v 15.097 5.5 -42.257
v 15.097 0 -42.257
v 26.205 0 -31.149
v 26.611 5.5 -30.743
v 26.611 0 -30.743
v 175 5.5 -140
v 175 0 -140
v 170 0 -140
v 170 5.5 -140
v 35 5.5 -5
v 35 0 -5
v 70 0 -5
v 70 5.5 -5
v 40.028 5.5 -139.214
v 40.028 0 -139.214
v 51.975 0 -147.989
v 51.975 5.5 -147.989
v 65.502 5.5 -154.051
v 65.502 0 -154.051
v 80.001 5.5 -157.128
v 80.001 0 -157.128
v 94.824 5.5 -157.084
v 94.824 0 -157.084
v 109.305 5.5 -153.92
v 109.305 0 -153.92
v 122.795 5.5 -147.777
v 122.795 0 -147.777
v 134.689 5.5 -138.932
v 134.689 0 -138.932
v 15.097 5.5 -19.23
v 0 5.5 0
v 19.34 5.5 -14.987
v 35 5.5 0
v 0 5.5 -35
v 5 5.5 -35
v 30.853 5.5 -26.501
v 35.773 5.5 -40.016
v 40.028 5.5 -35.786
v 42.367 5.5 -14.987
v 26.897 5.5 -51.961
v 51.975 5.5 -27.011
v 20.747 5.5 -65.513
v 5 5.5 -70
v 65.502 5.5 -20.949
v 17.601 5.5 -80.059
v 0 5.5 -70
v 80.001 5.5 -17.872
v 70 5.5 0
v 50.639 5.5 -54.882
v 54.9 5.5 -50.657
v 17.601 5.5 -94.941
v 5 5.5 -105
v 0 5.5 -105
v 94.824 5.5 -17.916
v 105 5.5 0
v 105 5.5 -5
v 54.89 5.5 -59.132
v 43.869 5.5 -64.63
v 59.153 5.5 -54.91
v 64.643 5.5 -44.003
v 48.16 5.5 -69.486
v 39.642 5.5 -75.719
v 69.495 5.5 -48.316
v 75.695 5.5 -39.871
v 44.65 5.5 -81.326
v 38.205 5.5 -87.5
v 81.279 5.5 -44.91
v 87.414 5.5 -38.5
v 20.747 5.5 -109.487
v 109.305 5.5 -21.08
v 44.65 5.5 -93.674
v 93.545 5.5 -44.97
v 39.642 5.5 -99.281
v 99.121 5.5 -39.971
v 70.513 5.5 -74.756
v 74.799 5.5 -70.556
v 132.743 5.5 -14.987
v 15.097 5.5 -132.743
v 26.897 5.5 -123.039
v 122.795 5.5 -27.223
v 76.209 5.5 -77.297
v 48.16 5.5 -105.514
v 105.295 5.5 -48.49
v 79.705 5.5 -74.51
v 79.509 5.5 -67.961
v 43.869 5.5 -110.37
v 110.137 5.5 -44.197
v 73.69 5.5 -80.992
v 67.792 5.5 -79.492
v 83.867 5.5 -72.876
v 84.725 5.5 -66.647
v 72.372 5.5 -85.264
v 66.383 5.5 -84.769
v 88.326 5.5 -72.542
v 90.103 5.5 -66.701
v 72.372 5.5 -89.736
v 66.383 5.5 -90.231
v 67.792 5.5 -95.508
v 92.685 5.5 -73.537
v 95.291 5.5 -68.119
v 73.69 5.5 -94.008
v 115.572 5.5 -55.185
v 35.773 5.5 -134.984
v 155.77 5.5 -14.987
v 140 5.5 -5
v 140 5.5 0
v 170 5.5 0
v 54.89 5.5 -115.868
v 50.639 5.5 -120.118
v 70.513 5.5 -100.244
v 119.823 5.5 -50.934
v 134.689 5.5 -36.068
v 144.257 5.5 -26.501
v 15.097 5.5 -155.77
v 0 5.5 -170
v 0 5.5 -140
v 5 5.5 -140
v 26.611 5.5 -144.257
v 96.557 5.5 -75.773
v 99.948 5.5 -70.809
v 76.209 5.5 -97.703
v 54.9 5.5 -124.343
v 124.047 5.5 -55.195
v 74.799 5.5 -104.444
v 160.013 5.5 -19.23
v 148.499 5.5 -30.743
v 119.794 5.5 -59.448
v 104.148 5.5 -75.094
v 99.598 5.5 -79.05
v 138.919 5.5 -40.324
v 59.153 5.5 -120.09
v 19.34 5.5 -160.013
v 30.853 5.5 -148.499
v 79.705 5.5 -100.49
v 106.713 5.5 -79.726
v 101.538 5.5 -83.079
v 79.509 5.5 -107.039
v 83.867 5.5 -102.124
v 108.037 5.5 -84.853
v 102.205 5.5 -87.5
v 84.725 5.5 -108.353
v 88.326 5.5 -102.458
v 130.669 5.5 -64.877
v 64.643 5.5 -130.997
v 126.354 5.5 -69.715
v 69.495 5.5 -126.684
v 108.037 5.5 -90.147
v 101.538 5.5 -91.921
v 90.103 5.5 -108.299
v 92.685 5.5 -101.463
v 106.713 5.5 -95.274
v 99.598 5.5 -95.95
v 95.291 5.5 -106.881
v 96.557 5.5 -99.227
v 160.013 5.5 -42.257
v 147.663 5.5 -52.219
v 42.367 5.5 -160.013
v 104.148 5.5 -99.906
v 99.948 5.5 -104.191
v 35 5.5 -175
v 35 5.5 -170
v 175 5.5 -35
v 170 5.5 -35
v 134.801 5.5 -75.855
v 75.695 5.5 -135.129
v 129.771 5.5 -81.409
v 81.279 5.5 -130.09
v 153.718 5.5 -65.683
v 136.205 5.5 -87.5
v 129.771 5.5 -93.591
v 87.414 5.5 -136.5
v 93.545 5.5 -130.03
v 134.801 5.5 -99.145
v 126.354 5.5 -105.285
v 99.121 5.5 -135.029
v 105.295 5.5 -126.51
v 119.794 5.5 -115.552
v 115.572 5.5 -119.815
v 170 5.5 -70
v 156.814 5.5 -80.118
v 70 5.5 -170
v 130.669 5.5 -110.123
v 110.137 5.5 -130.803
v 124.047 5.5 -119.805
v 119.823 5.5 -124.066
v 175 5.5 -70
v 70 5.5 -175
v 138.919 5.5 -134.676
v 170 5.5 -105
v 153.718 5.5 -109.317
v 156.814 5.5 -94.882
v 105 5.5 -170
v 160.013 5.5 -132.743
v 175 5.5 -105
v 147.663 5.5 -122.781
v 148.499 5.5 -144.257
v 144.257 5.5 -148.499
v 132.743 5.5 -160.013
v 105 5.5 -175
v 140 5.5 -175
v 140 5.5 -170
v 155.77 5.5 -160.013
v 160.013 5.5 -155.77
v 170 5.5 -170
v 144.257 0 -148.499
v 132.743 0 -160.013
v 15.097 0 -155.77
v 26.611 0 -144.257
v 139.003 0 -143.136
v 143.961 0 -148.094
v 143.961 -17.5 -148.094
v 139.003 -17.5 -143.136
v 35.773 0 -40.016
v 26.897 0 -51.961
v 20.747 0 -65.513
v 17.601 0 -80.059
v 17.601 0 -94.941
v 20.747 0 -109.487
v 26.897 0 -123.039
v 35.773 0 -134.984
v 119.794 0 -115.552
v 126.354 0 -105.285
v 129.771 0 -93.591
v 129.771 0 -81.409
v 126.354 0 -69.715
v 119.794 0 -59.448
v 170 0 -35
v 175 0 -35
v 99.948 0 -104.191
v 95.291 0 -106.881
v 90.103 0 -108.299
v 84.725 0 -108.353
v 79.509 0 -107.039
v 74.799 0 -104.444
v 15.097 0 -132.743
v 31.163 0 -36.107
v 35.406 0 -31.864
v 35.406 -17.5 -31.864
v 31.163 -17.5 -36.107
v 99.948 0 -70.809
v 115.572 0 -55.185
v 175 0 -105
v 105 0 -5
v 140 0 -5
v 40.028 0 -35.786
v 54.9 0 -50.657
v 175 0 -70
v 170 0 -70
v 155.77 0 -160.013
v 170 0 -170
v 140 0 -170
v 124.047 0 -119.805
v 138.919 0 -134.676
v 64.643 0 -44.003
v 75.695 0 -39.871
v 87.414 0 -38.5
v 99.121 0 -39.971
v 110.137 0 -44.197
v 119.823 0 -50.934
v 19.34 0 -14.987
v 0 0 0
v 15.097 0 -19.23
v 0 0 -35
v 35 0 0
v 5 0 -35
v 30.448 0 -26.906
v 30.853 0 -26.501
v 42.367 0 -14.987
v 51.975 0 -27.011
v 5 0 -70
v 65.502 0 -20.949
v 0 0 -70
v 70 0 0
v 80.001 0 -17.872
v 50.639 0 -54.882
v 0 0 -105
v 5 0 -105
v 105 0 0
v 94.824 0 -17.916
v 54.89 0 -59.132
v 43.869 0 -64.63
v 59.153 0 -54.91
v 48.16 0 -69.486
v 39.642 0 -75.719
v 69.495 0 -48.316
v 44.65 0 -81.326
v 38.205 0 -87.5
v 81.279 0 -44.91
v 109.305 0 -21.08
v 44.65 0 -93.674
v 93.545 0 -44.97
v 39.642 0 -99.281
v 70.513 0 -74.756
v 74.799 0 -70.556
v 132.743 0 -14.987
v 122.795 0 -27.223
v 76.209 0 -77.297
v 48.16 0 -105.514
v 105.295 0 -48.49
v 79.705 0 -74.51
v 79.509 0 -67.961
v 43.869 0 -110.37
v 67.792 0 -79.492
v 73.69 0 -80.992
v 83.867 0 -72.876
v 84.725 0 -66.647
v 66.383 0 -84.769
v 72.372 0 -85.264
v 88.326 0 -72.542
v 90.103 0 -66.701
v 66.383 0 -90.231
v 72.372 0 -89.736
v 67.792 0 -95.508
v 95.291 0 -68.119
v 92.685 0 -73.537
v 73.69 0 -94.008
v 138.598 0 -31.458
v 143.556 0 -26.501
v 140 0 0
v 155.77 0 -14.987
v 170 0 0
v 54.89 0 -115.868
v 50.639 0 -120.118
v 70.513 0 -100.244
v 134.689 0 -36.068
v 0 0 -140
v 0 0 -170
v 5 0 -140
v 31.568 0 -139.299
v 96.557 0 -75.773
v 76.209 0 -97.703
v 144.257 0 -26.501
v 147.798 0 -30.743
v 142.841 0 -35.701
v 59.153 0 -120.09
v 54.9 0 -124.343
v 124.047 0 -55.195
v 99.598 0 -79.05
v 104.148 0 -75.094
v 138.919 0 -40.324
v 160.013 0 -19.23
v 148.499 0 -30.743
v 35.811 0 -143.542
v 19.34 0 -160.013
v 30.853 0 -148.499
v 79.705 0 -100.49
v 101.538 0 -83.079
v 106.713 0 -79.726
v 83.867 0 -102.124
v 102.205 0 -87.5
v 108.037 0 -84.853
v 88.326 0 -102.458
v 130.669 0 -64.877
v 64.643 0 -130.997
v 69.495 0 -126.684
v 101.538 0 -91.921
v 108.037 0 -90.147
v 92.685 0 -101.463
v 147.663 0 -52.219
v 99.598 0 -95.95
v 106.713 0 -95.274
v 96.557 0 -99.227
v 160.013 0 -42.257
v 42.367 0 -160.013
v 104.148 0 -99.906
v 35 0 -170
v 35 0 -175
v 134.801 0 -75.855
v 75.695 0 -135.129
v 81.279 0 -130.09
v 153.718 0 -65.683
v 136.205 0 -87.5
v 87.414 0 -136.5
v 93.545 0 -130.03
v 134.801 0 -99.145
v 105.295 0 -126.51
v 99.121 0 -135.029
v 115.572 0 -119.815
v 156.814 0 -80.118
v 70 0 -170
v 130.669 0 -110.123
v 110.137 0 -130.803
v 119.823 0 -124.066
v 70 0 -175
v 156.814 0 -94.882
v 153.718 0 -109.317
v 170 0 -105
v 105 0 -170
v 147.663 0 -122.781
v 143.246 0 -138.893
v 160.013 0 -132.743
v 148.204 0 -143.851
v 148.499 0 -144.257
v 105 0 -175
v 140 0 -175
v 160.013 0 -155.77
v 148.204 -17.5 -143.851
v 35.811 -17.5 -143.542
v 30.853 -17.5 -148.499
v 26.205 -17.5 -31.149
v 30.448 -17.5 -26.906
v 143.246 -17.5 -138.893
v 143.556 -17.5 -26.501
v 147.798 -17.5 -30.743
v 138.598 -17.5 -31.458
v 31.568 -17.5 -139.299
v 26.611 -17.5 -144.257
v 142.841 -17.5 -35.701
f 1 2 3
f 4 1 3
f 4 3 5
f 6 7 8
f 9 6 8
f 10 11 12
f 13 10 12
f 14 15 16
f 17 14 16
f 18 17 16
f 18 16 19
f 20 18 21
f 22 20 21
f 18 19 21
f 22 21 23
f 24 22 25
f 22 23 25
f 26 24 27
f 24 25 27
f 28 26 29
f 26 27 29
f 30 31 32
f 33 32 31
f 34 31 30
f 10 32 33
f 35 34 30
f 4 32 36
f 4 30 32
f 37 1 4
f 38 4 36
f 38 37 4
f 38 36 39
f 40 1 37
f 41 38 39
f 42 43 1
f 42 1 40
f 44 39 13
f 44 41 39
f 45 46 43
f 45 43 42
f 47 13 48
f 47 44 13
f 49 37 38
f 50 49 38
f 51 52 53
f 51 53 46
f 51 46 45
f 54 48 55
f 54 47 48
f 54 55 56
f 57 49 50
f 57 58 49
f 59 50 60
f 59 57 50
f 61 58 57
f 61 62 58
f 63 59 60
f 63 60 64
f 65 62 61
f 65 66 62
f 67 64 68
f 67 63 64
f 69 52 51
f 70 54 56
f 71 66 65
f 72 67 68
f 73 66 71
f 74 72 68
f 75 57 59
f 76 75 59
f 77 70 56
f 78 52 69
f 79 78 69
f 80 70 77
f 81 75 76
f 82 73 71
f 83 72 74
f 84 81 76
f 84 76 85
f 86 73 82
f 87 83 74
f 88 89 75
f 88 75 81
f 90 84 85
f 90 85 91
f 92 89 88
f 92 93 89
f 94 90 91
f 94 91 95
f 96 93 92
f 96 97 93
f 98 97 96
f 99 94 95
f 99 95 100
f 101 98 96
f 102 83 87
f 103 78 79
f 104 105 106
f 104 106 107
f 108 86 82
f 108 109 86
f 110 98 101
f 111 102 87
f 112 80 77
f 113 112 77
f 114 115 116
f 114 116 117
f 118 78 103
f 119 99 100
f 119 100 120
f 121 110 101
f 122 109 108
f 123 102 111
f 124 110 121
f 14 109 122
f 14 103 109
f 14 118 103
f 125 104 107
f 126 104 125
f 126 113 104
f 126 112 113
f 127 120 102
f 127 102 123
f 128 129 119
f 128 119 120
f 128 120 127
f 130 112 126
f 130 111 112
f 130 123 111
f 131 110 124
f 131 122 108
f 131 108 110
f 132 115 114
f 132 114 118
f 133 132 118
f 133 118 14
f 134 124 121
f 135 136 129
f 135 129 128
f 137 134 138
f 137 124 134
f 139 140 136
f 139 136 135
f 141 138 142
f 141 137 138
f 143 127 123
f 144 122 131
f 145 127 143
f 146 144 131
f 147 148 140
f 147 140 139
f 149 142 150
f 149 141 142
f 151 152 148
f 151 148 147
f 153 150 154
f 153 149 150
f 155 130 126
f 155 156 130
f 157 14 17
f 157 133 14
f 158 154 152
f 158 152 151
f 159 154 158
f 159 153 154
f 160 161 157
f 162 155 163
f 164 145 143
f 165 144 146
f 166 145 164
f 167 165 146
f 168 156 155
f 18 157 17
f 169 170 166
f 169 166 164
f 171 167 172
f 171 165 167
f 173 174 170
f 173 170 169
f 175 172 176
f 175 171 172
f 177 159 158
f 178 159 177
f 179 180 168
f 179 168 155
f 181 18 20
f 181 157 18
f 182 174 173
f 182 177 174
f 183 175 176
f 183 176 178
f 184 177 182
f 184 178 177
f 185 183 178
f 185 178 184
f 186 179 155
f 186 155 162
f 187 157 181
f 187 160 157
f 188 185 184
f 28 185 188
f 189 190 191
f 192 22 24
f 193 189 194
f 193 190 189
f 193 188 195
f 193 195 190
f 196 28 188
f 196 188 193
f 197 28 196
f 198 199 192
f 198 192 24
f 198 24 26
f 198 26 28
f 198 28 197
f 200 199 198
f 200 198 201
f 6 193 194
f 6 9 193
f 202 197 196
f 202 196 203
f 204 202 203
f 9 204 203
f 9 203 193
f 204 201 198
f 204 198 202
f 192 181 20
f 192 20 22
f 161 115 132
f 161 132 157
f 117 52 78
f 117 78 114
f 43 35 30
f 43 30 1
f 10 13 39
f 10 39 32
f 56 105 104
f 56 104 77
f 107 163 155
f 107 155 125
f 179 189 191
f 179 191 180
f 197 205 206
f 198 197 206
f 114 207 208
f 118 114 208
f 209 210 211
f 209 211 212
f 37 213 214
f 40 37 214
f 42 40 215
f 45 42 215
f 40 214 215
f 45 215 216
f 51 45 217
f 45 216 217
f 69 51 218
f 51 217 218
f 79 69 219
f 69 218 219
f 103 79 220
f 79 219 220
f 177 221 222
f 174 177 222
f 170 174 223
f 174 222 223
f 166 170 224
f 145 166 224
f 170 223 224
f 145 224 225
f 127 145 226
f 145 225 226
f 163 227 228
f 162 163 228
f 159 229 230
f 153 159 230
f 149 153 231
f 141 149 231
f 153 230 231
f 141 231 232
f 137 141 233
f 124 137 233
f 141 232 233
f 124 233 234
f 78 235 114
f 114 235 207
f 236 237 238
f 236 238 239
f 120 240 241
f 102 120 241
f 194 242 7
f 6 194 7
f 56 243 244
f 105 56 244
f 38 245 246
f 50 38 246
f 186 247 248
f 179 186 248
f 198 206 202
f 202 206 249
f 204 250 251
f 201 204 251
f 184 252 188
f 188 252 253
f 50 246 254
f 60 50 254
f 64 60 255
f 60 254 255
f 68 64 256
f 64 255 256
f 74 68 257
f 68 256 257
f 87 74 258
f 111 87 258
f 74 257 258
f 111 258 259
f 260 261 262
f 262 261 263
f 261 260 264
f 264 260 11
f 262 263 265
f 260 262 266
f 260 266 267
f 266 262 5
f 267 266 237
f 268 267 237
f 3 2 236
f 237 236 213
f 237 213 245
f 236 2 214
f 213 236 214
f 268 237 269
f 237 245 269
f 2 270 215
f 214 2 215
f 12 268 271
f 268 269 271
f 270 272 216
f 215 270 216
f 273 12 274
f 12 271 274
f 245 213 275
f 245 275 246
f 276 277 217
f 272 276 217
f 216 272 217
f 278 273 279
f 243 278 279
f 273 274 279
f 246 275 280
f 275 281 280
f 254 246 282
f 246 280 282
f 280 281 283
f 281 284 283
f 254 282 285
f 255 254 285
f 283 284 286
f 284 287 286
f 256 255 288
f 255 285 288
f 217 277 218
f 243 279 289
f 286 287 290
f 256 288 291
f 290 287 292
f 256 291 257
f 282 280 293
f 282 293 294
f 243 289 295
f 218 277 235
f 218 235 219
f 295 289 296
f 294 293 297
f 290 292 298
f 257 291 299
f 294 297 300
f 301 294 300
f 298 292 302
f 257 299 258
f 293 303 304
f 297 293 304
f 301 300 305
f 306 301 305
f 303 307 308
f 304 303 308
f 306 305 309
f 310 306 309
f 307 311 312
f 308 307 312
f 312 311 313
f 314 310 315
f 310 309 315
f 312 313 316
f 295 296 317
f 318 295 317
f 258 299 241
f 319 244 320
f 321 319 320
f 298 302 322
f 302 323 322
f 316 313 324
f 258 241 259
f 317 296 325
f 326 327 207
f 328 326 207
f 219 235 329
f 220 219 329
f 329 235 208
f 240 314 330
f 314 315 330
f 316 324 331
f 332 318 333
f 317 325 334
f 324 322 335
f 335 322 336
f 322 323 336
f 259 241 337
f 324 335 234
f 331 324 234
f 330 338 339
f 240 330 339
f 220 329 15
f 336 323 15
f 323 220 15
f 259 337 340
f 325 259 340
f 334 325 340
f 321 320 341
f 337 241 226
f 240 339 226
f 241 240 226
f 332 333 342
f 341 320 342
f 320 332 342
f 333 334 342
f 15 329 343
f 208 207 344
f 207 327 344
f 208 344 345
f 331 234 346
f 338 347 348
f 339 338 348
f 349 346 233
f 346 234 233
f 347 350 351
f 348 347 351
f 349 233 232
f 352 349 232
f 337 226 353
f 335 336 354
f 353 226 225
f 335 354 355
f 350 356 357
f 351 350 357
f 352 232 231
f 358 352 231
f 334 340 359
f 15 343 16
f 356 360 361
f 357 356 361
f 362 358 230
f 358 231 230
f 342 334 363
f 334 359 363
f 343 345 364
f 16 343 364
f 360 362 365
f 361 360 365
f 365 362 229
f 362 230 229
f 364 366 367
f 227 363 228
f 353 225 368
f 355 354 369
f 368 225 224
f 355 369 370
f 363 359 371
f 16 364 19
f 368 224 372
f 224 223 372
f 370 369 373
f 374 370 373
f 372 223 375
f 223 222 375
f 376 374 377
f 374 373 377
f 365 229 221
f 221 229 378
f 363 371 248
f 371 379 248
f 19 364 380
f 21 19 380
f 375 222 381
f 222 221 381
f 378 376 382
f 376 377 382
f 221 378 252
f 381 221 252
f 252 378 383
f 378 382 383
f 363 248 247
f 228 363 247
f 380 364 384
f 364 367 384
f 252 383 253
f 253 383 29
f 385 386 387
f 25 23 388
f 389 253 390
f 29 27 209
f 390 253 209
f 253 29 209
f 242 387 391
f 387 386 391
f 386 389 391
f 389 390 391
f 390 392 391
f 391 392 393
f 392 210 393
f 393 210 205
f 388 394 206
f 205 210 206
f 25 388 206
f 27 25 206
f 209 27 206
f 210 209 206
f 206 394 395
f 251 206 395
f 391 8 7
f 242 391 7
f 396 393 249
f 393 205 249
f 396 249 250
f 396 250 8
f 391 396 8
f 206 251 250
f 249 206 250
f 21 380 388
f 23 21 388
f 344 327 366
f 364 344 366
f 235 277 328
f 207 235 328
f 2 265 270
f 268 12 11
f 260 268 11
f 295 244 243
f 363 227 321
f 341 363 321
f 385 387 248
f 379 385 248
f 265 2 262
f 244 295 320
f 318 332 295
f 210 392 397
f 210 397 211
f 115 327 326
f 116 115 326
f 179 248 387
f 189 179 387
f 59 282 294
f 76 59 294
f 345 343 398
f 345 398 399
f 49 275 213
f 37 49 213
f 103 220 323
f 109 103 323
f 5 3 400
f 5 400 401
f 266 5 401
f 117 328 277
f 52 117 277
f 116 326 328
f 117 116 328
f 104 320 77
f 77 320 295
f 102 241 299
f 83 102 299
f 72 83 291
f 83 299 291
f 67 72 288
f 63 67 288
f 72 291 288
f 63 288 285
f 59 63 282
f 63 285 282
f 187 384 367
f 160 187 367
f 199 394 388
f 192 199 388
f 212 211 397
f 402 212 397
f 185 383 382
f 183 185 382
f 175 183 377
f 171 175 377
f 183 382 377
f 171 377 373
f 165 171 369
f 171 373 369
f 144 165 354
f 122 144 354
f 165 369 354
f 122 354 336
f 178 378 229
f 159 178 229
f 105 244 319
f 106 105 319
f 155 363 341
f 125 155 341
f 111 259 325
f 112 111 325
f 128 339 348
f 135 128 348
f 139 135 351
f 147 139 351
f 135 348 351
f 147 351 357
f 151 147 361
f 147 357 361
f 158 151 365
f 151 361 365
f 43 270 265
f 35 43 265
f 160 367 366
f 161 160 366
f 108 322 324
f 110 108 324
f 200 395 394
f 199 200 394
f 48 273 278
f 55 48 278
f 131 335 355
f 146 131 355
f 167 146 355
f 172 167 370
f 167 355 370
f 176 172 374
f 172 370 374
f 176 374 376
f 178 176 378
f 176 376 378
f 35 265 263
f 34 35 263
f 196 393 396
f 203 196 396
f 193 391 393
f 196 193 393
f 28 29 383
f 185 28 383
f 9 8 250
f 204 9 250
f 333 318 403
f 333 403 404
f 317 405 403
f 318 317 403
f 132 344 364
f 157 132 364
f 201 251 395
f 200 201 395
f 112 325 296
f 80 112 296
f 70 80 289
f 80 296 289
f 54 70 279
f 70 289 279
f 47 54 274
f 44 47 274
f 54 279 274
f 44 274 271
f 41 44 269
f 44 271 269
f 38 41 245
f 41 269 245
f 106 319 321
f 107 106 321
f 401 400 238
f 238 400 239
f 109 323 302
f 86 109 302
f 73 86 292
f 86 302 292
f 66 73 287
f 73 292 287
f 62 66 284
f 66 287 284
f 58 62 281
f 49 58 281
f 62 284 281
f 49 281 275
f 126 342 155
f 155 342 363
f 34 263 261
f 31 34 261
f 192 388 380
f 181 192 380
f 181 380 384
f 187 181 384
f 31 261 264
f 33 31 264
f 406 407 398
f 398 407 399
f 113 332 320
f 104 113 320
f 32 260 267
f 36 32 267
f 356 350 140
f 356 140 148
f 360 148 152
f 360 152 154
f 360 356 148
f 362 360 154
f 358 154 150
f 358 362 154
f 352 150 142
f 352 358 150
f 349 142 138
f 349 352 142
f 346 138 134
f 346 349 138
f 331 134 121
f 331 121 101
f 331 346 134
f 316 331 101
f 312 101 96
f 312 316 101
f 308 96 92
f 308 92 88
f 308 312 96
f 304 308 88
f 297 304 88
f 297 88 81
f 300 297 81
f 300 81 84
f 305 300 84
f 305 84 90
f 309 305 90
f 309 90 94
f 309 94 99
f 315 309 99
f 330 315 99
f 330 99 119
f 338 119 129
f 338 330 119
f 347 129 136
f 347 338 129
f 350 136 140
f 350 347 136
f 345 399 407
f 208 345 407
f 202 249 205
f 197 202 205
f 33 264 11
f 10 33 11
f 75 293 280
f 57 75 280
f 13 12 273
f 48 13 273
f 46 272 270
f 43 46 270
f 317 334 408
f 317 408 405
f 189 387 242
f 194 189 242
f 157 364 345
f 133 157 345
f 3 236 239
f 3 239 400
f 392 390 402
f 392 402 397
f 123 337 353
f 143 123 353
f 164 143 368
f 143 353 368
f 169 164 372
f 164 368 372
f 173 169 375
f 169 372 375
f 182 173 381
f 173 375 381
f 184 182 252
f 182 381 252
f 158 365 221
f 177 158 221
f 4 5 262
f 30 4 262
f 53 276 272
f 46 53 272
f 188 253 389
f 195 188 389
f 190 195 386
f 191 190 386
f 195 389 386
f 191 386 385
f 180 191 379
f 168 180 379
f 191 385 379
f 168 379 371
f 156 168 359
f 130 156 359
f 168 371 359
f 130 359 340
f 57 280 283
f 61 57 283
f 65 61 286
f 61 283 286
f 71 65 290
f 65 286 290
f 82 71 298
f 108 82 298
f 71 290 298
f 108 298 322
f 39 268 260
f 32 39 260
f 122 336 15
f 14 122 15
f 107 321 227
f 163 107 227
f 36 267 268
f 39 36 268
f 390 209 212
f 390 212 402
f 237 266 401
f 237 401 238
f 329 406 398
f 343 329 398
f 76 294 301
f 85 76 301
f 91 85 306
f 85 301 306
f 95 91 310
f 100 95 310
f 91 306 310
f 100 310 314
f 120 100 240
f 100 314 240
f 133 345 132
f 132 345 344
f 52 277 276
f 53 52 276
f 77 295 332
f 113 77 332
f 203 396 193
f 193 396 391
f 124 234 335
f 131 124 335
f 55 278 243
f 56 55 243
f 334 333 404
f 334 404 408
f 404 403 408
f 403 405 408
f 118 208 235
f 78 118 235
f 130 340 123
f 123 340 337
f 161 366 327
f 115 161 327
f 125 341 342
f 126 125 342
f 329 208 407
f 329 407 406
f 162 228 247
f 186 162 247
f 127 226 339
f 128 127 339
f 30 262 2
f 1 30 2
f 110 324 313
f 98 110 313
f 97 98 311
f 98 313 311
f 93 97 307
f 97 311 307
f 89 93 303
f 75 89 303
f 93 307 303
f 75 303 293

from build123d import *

# Parameters (mm, degrees)
SKETCH_1_R      = 15
EXTRUDE_2_DEPTH = 5.5
EXTRUDE_3_DEPTH = 23


with BuildPart() as part:
    # Эскиз1 → Бобышка-Вытянуть2 (new body)
    with BuildSketch(Plane(origin=(0, 0, 0), x_dir=(1, 0, 0), z_dir=(0, 1, 0))):
        Polygon((170, 140), (170, 170), (140, 170), (140, 175), (105, 175), (105, 170), (70, 170), (70, 175), (35, 175), (35, 170), (0, 170), (0, 140), (5, 140), (5, 105), (0, 105), (0, 70), (5, 70), (5, 35), (0, 35), (0, 0), (35, 0), (35, 5), (70, 5), (70, 0), (105, 0), (105, 5), (140, 5), (140, 0), (170, 0), (170, 35), (175, 35), (175, 70), (170, 70), (170, 105), (175, 105), (175, 140), align=None)
        Polygon((19.339817755, 14.98716546), (30.853332638, 26.500680342), (42.36684752, 14.98716546), align=None, mode=Mode.SUBTRACT)
        Polygon((26.610691951, 30.743321029), (15.097177068, 19.229806147), (15.097177068, 42.256835911), align=None, mode=Mode.SUBTRACT)
        with BuildLine():
            ThreePointArc((54.899758827, 50.65711814), (87.41386875, 38.50044692), (119.822950774, 50.934408539))
            Line((119.822950774, 50.934408539), (134.689086203, 36.06827311))
            ThreePointArc((134.689086203, 36.06827311), (87.41366824, 17.500312244), (40.028175023, 35.785534336))
            Line((40.028175023, 35.785534336), (54.899758827, 50.65711814))
        make_face(mode=Mode.SUBTRACT)
        with BuildLine():
            Line((35.772862168, 134.984497145), (50.638997596, 120.118361717))
            ThreePointArc((50.638997596, 120.118361717), (38.204589058, 87.5), (50.638997596, 54.881638283))
            Line((50.638997596, 54.881638283), (35.772862168, 40.015502855))
            ThreePointArc((35.772862168, 40.015502855), (17.204589058, 87.5), (35.772862168, 134.984497145))
        make_face(mode=Mode.SUBTRACT)
        with BuildLine():
            ThreePointArc((74.798754674, 70.556113987), (87.415641051, 66.501060573), (99.948475479, 70.808883834))
            Line((99.948475479, 70.808883834), (115.572444887, 55.184914426))
            ThreePointArc((115.572444887, 55.184914426), (87.413986392, 44.500509855), (59.152804826, 54.910164139))
            Line((59.152804826, 54.910164139), (74.798754674, 70.556113987))
        make_face(mode=Mode.SUBTRACT)
        Polygon((155.770193853, 14.98716546), (132.743164089, 14.98716546), (144.256678971, 26.500680342), align=None, mode=Mode.SUBTRACT)
        Polygon((160.01283454, 19.229806147), (148.499319658, 30.743321029), (160.01283454, 42.256835911), align=None, mode=Mode.SUBTRACT)
        with BuildLine():
            Line((54.889503484, 115.867855829), (70.513472891, 100.243886422))
            ThreePointArc((70.513472891, 100.243886422), (66.204589058, 87.5), (70.513472891, 74.756113578))
            Line((70.513472891, 74.756113578), (54.889503484, 59.132144171))
            ThreePointArc((54.889503484, 59.132144171), (44.204589058, 87.5), (54.889503484, 115.867855829))
        make_face(mode=Mode.SUBTRACT)
        with BuildLine():
            Line((115.572444887, 119.815085574), (99.948475479, 104.191116166))
            ThreePointArc((99.948475479, 104.191116166), (87.415641051, 108.498939427), (74.798754674, 104.443886013))
            Line((74.798754674, 104.443886013), (59.152804826, 120.089835861))
            ThreePointArc((59.152804826, 120.089835861), (87.413986392, 130.499490145), (115.572444887, 119.815085574))
        make_face(mode=Mode.SUBTRACT)
        Polygon((15.097177068, 132.743164089), (15.097177068, 155.770193853), (26.610691951, 144.256678971), align=None, mode=Mode.SUBTRACT)
        Polygon((19.339817755, 160.01283454), (42.36684752, 160.01283454), (30.853332638, 148.499319658), align=None, mode=Mode.SUBTRACT)
        with BuildLine():
            Line((134.689086203, 138.93172689), (119.822950774, 124.065591461))
            ThreePointArc((119.822950774, 124.065591461), (87.41386875, 136.49955308), (54.899758827, 124.34288186))
            Line((54.899758827, 124.34288186), (40.028175023, 139.214465664))
            ThreePointArc((40.028175023, 139.214465664), (87.41366824, 157.499687756), (134.689086203, 138.93172689))
        make_face(mode=Mode.SUBTRACT)
        with Locations((87.204589058, 87.5)):
            Circle(SKETCH_1_R, mode=Mode.SUBTRACT)
        with BuildLine():
            ThreePointArc((104.148475071, 75.094165616), (108.204589058, 87.5), (104.148475071, 99.905834384))
            Line((104.148475071, 99.905834384), (119.794424918, 115.551784231))
            ThreePointArc((119.794424918, 115.551784231), (130.204589058, 87.5), (119.794424918, 59.448215769))
            Line((119.794424918, 59.448215769), (104.148475071, 75.094165616))
        make_face(mode=Mode.SUBTRACT)
        with BuildLine():
            ThreePointArc((124.047470918, 55.195169769), (136.204589058, 87.5), (124.047470918, 119.804830231))
            Line((124.047470918, 119.804830231), (138.919054721, 134.676414034))
            ThreePointArc((138.919054721, 134.676414034), (157.204589058, 87.5), (138.919054721, 40.323585966))
            Line((138.919054721, 40.323585966), (124.047470918, 55.195169769))
        make_face(mode=Mode.SUBTRACT)
        Polygon((160.01283454, 132.743164089), (148.499319658, 144.256678971), (160.01283454, 155.770193853), align=None, mode=Mode.SUBTRACT)
        Polygon((132.743164089, 160.01283454), (155.770193853, 160.01283454), (144.256678971, 148.499319658), align=None, mode=Mode.SUBTRACT)
    extrude(amount=EXTRUDE_2_DEPTH)

    # Эскиз2 → Бобышка-Вытянуть3 (add)
    with BuildSketch(Plane(origin=(0, 5.5, 0), x_dir=(1, 0, 0), z_dir=(0, 1, 0))):
        Polygon((30.853332638, 148.499319658), (26.610691951, 144.256678971), (31.568480277, 139.298890644), (35.811120964, 143.541531331), align=None)
        Polygon((148.203908716, 143.85125642), (143.961268028, 148.093897107), (139.003479702, 143.136108781), (143.246120389, 138.893468093), align=None)
        Polygon((143.555845478, 26.500680342), (147.798486165, 30.743321029), (142.840697838, 35.701109356), (138.598057151, 31.458468669), align=None)
        Polygon((26.2052694, 31.14874358), (30.447910087, 26.906102893), (35.405698413, 31.863891219), (31.163057726, 36.106531907), align=None)
    extrude(amount=-EXTRUDE_3_DEPTH)


solid = part.part
